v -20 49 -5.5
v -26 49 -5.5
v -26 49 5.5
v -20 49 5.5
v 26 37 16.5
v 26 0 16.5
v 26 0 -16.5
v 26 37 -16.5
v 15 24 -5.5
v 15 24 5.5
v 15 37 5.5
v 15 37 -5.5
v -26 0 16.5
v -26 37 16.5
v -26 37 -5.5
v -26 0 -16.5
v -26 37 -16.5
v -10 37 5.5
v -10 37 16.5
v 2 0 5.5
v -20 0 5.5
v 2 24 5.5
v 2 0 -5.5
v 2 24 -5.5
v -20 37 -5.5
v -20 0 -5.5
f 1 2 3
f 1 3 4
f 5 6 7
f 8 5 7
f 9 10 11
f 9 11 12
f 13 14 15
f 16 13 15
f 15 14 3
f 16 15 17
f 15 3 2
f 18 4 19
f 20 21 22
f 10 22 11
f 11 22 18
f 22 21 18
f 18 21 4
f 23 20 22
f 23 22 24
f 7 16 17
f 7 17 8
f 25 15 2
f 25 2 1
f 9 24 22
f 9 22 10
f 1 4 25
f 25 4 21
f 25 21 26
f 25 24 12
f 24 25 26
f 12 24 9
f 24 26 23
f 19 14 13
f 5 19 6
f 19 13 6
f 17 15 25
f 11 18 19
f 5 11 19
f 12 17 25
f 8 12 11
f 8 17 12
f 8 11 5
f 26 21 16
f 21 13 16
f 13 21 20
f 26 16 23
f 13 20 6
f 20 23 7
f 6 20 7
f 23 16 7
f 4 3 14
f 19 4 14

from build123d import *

# Parameters (mm, degrees)
SKETCH_1_W          = 52
SKETCH_1_H          = 33
SKETCH_1_W_2        = 22
SKETCH_1_H_2        = 11
EXTRUDE_1_DEPTH     = 37
SKETCH_3_W          = 13
SKETCH_3_H          = 11
CUT_EXTRUDE_1_DEPTH = 13
SKETCH_4_W          = 6
SKETCH_4_H          = 11
EXTRUDE_2_DEPTH     = 12
EXTRUDE_4_DEPTH     = 16
CUT_EXTRUDE_2_REACH = 35


with BuildPart() as part:
    # 草图1 → 凸台-拉伸1 (new body)
    with BuildSketch(Plane(origin=(0, 0, 0), x_dir=(1, 0, 0), z_dir=(0, 1, 0))):
        Rectangle(SKETCH_1_W, SKETCH_1_H)
        with Locations((-9, 0)):
            Rectangle(SKETCH_1_W_2, SKETCH_1_H_2, mode=Mode.SUBTRACT)
    extrude(amount=EXTRUDE_1_DEPTH)

    # 草图3 → 切除-拉伸1 (cut)
    with BuildSketch(Plane(origin=(0, 37, 0), x_dir=(1, 0, 0), z_dir=(0, 1, 0))):
        with Locations((8.5, 0)):
            Rectangle(SKETCH_3_W, SKETCH_3_H)
    extrude(amount=-CUT_EXTRUDE_1_DEPTH, mode=Mode.SUBTRACT)

    # 草图4 → 凸台-拉伸2 (add)
    with BuildSketch(Plane(origin=(0, 37, 0), x_dir=(1, 0, 0), z_dir=(0, 1, 0))):
        with Locations((-23, 0)):
            Rectangle(SKETCH_4_W, SKETCH_4_H)
    extrude(amount=EXTRUDE_2_DEPTH)

    # 草图6 → 凸台-拉伸4 (add)
    with BuildSketch(Plane.ZY.offset(26)):
        Polygon((5.5, 49), (16.5, 37), (5.5, 37), align=None)
    extrude(amount=-EXTRUDE_4_DEPTH)

    # 草图7 → 切除-拉伸2 (cut, up to next)
    with BuildSketch(Plane.XY.offset(16.5), mode=Mode.PRIVATE) as cut_extrude_2_sk1:
        Polygon((-20, 49), (-10, 37), (-10, 49), align=None)
    cut_extrude_2_tool1 = extrude(cut_extrude_2_sk1.sketch, amount=-CUT_EXTRUDE_2_REACH, mode=Mode.PRIVATE) & part.part
    add(cut_extrude_2_tool1.solids().sort_by_distance((-13.333333, 45, 16.5))[0], mode=Mode.SUBTRACT)


solid = part.part
